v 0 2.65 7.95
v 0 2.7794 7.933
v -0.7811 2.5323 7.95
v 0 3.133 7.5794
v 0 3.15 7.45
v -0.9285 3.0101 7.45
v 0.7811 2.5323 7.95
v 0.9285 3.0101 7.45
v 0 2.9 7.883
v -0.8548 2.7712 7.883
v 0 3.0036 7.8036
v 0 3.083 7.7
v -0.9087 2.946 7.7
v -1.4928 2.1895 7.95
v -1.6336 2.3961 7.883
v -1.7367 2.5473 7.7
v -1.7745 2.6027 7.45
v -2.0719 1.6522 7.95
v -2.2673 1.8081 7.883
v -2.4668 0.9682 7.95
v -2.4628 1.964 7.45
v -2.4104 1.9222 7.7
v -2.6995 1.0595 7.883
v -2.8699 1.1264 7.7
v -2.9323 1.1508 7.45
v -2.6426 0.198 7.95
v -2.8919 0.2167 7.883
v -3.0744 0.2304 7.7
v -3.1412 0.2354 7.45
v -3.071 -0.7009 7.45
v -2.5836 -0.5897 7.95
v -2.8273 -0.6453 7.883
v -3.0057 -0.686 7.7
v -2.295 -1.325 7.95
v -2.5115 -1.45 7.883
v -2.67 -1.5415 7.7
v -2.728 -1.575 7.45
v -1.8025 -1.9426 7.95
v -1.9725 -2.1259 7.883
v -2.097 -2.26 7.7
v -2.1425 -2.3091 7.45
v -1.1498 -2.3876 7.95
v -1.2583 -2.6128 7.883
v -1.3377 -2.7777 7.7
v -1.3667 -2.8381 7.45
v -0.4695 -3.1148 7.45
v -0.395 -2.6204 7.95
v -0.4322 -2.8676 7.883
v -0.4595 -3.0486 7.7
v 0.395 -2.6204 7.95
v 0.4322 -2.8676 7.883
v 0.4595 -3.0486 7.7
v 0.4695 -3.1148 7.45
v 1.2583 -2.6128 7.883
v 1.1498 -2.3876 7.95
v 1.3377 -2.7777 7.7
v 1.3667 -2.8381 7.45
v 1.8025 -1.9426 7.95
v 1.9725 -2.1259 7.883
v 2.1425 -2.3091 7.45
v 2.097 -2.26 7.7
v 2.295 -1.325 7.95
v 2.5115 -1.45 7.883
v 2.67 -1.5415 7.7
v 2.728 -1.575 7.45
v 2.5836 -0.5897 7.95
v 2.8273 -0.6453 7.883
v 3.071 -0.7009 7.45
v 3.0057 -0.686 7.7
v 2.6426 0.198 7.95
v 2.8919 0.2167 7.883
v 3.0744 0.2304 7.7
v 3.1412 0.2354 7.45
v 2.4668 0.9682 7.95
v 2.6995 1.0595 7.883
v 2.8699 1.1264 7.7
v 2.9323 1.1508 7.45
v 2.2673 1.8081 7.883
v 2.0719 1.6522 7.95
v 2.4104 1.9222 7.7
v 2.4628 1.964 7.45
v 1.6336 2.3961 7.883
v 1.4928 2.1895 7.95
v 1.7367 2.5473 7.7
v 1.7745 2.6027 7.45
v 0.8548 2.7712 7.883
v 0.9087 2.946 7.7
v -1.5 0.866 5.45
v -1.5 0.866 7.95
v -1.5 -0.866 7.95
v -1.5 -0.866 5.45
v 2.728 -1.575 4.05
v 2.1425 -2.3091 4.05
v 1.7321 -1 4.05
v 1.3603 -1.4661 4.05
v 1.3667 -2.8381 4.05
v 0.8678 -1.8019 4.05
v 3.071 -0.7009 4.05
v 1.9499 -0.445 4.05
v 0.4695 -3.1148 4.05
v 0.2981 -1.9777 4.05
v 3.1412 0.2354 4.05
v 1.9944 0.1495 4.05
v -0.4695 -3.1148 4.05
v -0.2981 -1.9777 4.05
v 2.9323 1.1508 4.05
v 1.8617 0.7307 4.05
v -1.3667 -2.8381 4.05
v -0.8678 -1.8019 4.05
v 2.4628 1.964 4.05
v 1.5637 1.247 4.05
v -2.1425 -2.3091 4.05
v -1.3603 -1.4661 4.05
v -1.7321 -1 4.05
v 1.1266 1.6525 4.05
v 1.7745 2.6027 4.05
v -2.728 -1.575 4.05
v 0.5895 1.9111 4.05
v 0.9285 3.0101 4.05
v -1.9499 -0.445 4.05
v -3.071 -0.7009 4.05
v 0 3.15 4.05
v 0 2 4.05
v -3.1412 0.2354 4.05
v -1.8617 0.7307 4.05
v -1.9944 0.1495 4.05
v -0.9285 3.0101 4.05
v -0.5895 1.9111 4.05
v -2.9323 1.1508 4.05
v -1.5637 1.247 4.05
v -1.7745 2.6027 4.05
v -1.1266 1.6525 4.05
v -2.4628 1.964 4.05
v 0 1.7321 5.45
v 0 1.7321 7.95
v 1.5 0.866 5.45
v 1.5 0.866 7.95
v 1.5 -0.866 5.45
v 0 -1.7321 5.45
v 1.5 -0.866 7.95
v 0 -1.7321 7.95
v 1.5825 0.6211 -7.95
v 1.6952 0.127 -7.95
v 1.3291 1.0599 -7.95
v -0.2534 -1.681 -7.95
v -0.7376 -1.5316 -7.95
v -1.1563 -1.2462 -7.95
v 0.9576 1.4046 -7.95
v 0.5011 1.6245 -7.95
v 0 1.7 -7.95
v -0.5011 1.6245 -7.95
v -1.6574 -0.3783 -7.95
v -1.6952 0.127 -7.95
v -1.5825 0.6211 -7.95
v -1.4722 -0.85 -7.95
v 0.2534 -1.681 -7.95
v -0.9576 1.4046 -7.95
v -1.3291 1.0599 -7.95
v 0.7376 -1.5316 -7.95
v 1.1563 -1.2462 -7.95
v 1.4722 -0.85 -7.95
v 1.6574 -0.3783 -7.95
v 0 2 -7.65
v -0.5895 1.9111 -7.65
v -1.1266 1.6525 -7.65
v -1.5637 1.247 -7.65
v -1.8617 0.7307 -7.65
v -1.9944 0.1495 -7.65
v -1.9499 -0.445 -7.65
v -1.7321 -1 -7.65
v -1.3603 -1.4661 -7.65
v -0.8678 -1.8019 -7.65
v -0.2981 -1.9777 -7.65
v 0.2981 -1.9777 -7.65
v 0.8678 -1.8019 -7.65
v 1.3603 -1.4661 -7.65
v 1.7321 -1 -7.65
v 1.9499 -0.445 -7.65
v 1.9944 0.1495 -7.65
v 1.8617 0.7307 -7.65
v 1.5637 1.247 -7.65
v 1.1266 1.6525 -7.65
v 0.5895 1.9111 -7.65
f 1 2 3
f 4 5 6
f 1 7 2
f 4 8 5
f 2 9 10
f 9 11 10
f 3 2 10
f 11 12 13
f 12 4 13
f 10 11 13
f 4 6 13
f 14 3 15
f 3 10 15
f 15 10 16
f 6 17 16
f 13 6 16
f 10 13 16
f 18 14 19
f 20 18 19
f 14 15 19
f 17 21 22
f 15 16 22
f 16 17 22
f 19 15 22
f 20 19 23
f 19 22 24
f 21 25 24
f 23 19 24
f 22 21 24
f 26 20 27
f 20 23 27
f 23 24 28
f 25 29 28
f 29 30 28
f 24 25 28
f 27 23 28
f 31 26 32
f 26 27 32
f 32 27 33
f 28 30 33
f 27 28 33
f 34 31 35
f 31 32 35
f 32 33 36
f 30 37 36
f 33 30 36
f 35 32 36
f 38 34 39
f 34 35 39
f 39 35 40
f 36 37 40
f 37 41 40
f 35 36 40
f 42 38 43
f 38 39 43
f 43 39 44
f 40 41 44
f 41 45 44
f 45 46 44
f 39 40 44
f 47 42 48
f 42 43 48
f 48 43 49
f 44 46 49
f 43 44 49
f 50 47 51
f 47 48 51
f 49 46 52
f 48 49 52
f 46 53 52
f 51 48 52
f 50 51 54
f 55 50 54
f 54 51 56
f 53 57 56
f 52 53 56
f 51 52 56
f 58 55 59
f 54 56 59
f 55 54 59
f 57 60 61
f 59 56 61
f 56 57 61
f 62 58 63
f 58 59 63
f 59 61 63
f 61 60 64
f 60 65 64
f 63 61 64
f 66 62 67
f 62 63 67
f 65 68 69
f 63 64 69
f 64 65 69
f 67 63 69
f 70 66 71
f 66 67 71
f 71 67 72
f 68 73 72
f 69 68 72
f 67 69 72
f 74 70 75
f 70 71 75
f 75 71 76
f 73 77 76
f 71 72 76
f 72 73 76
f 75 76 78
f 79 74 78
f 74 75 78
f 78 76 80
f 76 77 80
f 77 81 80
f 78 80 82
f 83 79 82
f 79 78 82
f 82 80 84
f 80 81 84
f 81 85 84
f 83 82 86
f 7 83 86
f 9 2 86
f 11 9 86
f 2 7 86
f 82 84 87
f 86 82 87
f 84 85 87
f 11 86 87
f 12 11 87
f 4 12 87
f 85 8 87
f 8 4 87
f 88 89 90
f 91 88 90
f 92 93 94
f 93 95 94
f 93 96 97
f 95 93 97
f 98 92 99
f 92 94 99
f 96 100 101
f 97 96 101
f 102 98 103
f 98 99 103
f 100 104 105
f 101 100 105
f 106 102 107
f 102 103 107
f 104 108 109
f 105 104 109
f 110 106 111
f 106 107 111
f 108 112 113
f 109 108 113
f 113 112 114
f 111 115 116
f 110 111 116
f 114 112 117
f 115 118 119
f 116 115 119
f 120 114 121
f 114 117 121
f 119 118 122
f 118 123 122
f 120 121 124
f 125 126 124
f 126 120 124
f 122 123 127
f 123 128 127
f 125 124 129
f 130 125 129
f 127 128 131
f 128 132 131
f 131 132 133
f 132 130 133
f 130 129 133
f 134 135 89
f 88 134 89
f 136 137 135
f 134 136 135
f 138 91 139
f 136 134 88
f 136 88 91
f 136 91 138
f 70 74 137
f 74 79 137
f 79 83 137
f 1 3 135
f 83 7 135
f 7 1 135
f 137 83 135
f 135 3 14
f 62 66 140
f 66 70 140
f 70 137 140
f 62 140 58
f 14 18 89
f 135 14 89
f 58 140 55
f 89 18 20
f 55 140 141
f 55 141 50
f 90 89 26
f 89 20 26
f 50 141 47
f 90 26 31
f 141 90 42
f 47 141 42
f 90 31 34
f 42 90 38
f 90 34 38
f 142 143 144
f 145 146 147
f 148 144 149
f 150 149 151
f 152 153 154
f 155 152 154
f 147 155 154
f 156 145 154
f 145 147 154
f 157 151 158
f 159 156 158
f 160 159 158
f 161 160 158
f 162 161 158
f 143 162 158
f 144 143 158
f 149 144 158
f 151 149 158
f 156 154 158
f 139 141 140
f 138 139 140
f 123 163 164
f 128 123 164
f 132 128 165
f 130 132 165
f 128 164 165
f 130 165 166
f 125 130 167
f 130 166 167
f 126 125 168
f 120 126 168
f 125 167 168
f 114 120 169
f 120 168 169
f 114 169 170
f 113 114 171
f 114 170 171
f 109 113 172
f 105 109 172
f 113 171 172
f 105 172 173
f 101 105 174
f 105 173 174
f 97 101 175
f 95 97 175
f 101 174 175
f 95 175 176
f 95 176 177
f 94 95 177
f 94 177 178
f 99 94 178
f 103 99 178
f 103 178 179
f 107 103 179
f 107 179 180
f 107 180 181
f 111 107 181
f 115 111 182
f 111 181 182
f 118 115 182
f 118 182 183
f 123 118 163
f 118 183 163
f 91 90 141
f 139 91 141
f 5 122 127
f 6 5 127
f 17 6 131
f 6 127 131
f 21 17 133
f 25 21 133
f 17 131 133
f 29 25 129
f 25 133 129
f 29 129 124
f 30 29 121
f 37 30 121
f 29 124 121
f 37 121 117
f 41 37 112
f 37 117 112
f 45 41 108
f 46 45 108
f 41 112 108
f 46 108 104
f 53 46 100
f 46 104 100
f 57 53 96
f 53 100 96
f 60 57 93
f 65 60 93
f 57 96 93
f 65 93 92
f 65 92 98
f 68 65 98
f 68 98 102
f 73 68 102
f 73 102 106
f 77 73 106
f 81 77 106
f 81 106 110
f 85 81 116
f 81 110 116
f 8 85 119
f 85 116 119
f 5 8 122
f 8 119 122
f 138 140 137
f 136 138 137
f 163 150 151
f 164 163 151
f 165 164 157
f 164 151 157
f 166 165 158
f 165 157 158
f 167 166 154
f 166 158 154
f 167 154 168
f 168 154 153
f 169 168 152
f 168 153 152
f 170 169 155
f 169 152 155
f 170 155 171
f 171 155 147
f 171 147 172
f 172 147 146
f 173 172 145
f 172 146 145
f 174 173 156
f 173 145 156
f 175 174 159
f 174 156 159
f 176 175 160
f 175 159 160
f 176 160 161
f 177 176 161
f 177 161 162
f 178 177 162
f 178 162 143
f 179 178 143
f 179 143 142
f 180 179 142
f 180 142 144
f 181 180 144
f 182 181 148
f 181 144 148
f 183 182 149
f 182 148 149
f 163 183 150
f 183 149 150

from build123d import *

# Parameters (mm, degrees)
CUT_EXTRUDE_1_DEPTH = 2.5
FILLET_1_R          = 0.5
CHAMFER_1_SIZE      = 0.3


with BuildPart() as part:
    # 草图1 → 旋转1 (revolve)
    with BuildSketch(Plane(origin=(0, 0, 0), x_dir=(0, 0, -1), z_dir=(1, 0, 0))):
        Polygon((-7.95, 0), (-7.95, 3.15), (-4.05, 3.15), (-4.05, 2), (7.95, 2), (7.95, 0), align=None)
    revolve(axis=Axis((0, 0, -7.95), (0, 0, 1)))

    # 草图2 → 切除-拉伸1 (cut)
    with BuildSketch(Plane.XY.offset(7.95)):
        Polygon((0, 1.732050808), (-1.5, 0.866025404), (-1.5, -0.866025404), (0, -1.732050808), (1.5, -0.866025404), (1.5, 0.866025404), align=None)
    extrude(amount=-CUT_EXTRUDE_1_DEPTH, mode=Mode.SUBTRACT)

    # 圆角1
    fillet_1_edges = [part.edges().sort_by_distance(p)[0] for p in [
        (0, -3.15, 7.95),
    ]]
    fillet(fillet_1_edges, radius=FILLET_1_R)

    # 倒角1
    chamfer_1_edges = [part.edges().sort_by_distance(p)[0] for p in [
        (0, -2, -7.95),
    ]]
    chamfer(chamfer_1_edges, length=CHAMFER_1_SIZE)


solid = part.part
